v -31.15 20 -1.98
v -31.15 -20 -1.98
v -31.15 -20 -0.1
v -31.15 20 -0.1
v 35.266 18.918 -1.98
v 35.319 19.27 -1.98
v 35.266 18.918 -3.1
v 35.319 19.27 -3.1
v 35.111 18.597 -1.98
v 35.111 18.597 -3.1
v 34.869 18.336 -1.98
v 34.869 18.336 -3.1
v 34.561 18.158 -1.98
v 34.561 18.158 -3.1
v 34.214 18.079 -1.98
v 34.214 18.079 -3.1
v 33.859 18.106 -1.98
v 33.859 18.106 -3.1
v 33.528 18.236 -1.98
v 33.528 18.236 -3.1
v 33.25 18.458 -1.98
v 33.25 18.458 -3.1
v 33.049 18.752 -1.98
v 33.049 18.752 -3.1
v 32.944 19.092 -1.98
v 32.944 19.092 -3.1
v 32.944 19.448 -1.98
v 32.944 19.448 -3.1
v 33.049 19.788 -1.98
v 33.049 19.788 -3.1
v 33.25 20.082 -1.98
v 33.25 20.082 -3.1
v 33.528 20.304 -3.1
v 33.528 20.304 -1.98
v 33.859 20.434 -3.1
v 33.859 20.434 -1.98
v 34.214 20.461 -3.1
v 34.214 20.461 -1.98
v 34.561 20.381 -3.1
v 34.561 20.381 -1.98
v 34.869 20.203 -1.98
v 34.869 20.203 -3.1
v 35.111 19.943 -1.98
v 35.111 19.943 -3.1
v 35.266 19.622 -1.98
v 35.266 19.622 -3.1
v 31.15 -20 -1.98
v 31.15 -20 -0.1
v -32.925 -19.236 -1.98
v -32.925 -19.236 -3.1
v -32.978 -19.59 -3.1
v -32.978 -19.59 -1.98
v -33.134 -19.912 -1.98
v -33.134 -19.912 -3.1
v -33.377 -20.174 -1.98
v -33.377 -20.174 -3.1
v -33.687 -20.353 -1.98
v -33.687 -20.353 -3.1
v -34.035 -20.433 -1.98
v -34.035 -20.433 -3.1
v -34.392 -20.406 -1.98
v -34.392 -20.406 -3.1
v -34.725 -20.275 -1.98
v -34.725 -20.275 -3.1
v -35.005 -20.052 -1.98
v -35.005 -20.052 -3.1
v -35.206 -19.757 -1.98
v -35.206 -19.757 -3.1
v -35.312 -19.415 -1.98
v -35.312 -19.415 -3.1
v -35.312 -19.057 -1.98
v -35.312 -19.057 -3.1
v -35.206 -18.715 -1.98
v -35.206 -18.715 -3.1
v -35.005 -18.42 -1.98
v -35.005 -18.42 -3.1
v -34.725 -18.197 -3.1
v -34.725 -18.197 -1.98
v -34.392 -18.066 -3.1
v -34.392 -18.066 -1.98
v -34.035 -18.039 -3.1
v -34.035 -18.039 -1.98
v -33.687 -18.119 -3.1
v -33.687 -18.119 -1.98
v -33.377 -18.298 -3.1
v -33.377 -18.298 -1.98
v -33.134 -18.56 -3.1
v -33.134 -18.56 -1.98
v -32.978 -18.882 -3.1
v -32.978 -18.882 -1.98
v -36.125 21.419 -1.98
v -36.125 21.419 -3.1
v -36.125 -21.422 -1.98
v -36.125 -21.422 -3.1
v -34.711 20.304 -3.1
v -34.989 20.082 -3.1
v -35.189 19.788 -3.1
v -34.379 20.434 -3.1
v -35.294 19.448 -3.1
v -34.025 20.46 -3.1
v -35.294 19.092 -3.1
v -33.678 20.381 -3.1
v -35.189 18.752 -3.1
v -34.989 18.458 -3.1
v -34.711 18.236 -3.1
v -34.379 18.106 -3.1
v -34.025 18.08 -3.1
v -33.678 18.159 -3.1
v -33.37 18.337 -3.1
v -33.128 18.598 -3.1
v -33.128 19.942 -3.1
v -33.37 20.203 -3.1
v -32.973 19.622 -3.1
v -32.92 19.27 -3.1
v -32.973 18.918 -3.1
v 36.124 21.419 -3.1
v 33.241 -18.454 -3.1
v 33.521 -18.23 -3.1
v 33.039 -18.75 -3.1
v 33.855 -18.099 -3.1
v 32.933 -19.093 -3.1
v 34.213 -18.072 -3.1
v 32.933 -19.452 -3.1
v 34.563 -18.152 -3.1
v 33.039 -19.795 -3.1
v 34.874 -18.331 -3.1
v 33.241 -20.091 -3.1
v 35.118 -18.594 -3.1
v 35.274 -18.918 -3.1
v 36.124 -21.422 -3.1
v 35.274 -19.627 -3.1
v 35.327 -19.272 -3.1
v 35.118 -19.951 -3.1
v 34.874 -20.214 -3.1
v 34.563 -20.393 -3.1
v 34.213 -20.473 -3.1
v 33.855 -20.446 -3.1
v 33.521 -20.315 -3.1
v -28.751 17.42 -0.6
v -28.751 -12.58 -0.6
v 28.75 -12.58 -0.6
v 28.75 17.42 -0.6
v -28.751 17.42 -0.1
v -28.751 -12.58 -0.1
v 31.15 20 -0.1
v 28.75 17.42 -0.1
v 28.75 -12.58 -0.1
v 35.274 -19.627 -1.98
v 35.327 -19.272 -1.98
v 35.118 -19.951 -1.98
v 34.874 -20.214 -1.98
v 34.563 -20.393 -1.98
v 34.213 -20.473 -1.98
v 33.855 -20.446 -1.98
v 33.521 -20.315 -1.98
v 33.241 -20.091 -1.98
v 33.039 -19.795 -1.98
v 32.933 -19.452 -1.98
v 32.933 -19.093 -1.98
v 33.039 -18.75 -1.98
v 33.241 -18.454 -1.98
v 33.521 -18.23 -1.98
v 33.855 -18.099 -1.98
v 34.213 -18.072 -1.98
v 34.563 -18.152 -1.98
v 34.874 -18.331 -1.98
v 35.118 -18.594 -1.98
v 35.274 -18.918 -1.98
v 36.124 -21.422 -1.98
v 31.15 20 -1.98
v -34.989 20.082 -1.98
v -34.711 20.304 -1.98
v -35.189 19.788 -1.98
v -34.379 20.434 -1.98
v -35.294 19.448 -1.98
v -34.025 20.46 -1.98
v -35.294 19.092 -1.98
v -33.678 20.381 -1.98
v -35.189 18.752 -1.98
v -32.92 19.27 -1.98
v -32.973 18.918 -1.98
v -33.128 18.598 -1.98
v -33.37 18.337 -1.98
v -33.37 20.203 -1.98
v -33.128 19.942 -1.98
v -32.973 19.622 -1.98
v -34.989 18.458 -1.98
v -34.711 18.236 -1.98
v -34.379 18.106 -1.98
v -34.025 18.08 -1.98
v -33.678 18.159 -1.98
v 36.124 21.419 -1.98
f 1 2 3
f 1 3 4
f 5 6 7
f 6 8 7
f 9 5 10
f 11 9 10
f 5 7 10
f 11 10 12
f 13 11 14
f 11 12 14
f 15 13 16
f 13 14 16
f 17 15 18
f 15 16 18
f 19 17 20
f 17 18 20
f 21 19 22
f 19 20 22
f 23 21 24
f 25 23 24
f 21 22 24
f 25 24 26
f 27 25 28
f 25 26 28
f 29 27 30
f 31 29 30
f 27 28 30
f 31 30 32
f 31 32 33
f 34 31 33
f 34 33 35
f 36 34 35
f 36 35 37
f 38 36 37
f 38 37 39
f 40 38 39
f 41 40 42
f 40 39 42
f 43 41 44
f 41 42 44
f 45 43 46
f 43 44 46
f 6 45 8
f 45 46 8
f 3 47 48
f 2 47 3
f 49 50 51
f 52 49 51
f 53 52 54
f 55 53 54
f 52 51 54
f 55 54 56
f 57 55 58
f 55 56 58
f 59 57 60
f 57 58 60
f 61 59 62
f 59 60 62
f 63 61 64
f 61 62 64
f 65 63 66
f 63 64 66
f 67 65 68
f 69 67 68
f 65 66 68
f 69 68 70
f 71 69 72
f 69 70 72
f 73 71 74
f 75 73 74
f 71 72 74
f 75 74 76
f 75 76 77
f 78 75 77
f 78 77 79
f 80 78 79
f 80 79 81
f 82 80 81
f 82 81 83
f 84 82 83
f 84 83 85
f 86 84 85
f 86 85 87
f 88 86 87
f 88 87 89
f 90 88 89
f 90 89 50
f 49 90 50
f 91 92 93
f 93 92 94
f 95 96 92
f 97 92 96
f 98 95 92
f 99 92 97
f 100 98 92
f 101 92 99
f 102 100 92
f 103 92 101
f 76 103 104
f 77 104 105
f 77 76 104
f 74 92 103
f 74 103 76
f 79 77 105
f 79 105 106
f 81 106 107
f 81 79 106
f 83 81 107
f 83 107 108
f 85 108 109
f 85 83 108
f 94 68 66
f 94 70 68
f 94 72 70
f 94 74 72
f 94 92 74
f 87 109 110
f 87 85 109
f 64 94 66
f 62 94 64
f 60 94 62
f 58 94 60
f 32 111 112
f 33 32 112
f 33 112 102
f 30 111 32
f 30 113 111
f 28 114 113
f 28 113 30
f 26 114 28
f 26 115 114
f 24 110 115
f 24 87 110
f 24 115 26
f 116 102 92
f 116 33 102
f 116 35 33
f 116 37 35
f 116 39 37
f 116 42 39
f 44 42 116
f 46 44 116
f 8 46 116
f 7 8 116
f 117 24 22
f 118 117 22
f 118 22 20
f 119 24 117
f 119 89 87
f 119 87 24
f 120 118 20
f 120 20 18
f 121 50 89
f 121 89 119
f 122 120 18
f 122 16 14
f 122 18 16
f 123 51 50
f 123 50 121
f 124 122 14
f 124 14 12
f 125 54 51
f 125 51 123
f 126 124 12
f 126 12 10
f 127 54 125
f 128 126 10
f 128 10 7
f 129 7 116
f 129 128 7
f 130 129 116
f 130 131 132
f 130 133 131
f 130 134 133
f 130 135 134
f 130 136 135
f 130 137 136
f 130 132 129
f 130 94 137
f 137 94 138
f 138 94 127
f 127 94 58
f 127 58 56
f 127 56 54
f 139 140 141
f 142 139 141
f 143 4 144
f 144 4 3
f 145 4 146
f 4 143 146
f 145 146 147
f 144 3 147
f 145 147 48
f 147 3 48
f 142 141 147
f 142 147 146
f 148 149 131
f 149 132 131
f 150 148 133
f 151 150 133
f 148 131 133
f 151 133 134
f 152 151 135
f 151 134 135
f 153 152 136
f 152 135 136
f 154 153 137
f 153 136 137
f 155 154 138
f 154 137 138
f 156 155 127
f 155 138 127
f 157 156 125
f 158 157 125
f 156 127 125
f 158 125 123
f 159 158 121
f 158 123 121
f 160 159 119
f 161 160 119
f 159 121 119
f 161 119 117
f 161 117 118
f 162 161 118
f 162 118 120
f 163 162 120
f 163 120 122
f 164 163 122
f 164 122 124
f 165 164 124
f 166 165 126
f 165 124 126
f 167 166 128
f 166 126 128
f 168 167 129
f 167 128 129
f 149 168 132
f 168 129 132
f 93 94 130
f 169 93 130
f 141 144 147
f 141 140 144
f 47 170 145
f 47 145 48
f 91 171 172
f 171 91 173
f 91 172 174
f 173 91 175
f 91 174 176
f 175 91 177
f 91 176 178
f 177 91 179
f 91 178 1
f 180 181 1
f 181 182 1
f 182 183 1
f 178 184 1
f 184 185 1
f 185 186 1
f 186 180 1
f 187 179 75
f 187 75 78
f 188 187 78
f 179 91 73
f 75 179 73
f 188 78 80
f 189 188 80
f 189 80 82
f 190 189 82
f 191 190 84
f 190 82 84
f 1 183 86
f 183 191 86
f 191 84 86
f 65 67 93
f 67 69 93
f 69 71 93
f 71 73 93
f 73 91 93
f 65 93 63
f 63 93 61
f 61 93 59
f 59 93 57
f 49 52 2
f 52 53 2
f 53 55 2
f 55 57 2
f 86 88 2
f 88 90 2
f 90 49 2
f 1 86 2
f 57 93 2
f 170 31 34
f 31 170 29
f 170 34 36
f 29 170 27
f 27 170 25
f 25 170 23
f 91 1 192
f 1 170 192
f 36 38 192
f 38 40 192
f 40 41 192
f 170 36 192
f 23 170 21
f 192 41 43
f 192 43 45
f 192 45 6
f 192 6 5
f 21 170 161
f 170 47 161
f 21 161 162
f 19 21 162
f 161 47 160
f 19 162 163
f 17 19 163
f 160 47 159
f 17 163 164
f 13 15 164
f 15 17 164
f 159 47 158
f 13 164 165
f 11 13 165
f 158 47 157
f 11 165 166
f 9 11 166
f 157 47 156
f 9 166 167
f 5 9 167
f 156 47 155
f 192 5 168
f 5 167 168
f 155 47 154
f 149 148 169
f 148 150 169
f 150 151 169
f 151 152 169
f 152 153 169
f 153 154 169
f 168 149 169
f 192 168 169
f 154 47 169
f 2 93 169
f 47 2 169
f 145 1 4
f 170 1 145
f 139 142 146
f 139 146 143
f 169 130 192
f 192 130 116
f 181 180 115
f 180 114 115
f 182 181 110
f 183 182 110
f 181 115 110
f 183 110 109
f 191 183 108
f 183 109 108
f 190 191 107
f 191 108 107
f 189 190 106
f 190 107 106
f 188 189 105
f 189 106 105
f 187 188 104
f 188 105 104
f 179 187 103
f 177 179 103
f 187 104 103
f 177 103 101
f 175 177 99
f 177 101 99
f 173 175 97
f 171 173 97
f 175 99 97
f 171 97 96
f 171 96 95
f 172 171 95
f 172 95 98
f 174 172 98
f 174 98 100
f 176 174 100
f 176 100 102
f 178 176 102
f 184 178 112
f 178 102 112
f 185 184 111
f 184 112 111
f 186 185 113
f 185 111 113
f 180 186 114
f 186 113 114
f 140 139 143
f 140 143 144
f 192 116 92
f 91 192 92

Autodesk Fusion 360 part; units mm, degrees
sketch "Sketch1" plane through (0, 0, 0) normal (0, 0, 1) x (1, 0, 0)
  line L0 (36.125, -21.42) -> (-36.125, -21.42)
  line L1 (-36.125, -21.42) -> (-36.125, 21.42)
  line L2 (-36.125, 21.42) -> (36.125, 21.42)
  line L3 (36.125, 21.42) -> (36.125, -21.42)
  line L4 (36.125, -21.42) -> (-36.125, 21.42) construction
  line L5 (-36.125, -21.42) -> (36.125, 21.42) construction
  line L6 (31.15, -20) -> (-31.15, -20)
  line L7 (-31.15, -20) -> (-31.15, 20)
  line L8 (-31.15, 20) -> (31.15, 20)
  line L9 (31.15, 20) -> (31.15, -20)
  line L10 (31.15, -20) -> (-31.15, 20) construction
  line L11 (-31.15, -20) -> (31.15, 20) construction
  line L12 (28.75, -15) -> (-28.75, 15) construction
  line L13 (-28.75, -15) -> (28.75, 15) construction
  line L14 (36.125, -18.0538) -> (34.125, -18.0538) construction
  line L15 (34.125, -21.42) -> (34.125, 22) construction
  line L16 (-36.125, 20.5191) -> (-34.125, 20.5191) construction
  line L17 (-34.125, 20.5191) -> (-34.125, -21.42) construction
  circle A0 centre (-34.125, -19.236) radius 1.2
  line L18 (-34.125, -21.42) -> (-34.125, -20.67)
  line L19 (-34.1139, 21.42) -> (-34.1139, 19.27) construction
  circle A1 centre (-34.1139, 19.27) radius 1.2
  line L20 (34.125, 21.42) -> (34.125, 19.27) construction
  circle A2 centre (34.125, 19.27) radius 1.2
  line L21 (34.125, -21.42) -> (34.125, -19.27) construction
  circle A3 centre (34.125, -19.27) radius 1.2
  line L22 (0, 21.42) -> (0, 17.42) construction
  line L23 (0, 17.42) -> (28.75, 17.42) construction
  line L24 (28.75, 17.42) -> (-28.75, 17.42)
  line L25 (-28.75, 17.42) -> (-28.75, -12.58)
  line L26 (-28.75, -12.58) -> (28.75, -12.58)
  line L27 (28.75, -12.58) -> (28.75, 17.42)
  circle A4 centre (34.125, 19.27) radius 2
  circle A5 centre (-34.1139, 19.27) radius 2
  circle A6 centre (-34.125, -19.236) radius 2
  circle A7 centre (34.125, -19.27) radius 2
  line L28 (38.125, 23.42) -> (-38.125, 23.42)
  line L29 (-38.125, 23.42) -> (-38.125, -23.42)
  line L30 (-38.125, -23.42) -> (38.125, -23.42)
  line L31 (38.125, -23.42) -> (38.125, 23.42)
  line L32 (38.125, 23.42) -> (-38.125, -23.42) construction
  line L33 (-38.125, 23.42) -> (38.125, -23.42) construction
  line L34 (37.25, 22.25) -> (-37.25, 22.25)
  line L35 (-37.25, 22.25) -> (-37.25, -22.25)
  line L36 (-37.25, -22.25) -> (37.25, -22.25)
  line L37 (37.25, -22.25) -> (37.25, 22.25)
  line L38 (37.25, 22.25) -> (-37.25, -22.25) construction
  line L39 (-37.25, 22.25) -> (37.25, -22.25) construction
  dimension "d1" = 72.25
  dimension "d2" = 42.84
  dimension "d3" = 62.3
  dimension "d4" = 40
  dimension "d5" = 57.5
  dimension "d6" = 30
  dimension "d7" = 2
  dimension "d8" = 2
  dimension "d9" = 2.4
  dimension "d11" = 0.75
  dimension "d12" = 2.15
  dimension "d13" = 2.4
  dimension "d14" = 2.4
  dimension "d15" = 2.15
  dimension "d16" = 2.4
  dimension "d17" = 2.15
  dimension "d18" = 2.4
  dimension "d19" = 4
  dimension "d20" = 28.75
  dimension "d21" = 57.5
  dimension "d22" = 30
  dimension "d24" = 30
  dimension "d27" = 30
  dimension "d28" = 4
  dimension "d29" = 4
  dimension "d30" = 4
  dimension "d31" = 4
  dimension "d37" = 76.25
  dimension "d38" = 46.84
  dimension "d39" = 74.5
  dimension "d40" = 44.5
extrude "Extrude1" add sketch "Sketch1" against normal blind 3.1 contours A7 | A4 | A6 | A5 makes body 1 at (36.1225, 19.1703, -2.0667) makes body 2 at (36.1225, -19.3697, -2.0667) makes body 3 at (-32.1164, 19.1703, -2.0667) makes body 4 at (-32.1349, -19.0369, -1.0333)
extrude "Extrude2" add sketch "Sketch1" along normal blind 1 contours A7 | A4 | L0 L1 L2 L3 L18 A6 | L0 L1 L18 A6 | A6 | L6 L7 L8 L9 | A0 | A1 | A2 | A3 | A5 | L28 L29 L30 L31 | L34 L35 L36 L37 bodies 1 2 3 4
extrude "Extrude3" add sketch "Sketch1" against normal blind 3 contours L34 L35 L36 L37 bodies 1
fillet "Fillet1" radius 1 4 edges at (-38.125, 0, 1) (0, -23.42, 1) (38.125, 0, 1) (0, 23.42, 1) on bodies 1
chamfer "Chamfer1" distance 3 distance2 0.9 4 edges at (28.75, 2.42, 1) (0, 17.42, 1) (-28.75, 2.42, 1) (0, -12.58, 1) measured on face at (9.5833, -19.1401, 1) measured on face at (9.5833, -19.1401, 1) measured on face at (9.5833, -19.1401, 1) measured on face at (9.5833, -19.1401, 1) on bodies 1
sketch "Sketch2" plane through (0, 0, -3.1) normal (0, 0, -1) x (1, 0, 0)
  circle A0 centre (-34.125, 19.236) radius 1.2
  circle A1 centre (-34.125, 19.236) radius 2
  line L0 (-36.1253, 21.4221) -> (36.1242, 21.4221)
  line L1 (36.1242, 21.4221) -> (36.1242, -21.4189)
  line L2 (36.1242, -21.4189) -> (-36.1253, -21.4189)
  line L3 (-36.1253, -21.4189) -> (-36.1253, 21.4221)
  line L4 (-31.15, -20) -> (31.15, -20)
  line L5 (31.15, -20) -> (31.15, 20)
  line L6 (31.15, 20) -> (-31.15, 20)
  line L7 (-31.15, 20) -> (-31.15, -20)
  circle A2 centre (34.1232, 19.2725) radius 1.2039
  circle A3 centre (-34.125, 19.236) radius 1.2
  circle A4 centre (-34.1138, -19.2699) radius 1.1936
  circle A5 centre (34.1249, -19.2699) radius 1.194
  line L8 (-28.7509, 12.58) -> (28.75, 12.58)
  line L9 (28.75, 12.58) -> (28.75, -17.42)
  line L10 (28.75, -17.42) -> (-28.7509, -17.42)
  line L11 (-28.7509, -17.42) -> (-28.7509, 12.58)
extrude "Extrude1'" add sketch "Sketch2" against normal blind 1.12 separate body contours L0 L1 L2 L3 | L4 L5 L6 L7 | L8 L9 L10 L11 makes body 5 in component "Component"
extrude "Extrude2'" add sketch "Sketch2" against normal blind 3 contours L4 L5 L6 L7 bodies 5 in component "Component"
extrude "Extrude3'" add sketch "Sketch2" against normal blind 2.5 contours L8 L9 L10 L11 bodies 5 in component "Component"
extrude "Extrude4" add sketch "Sketch2" against normal blind 1.12 contours A1 bodies 5 in component "Component"
component "Component" placed x (1, 0, 0) y (0, 1, 0) z (0, 0, 1) at (0, 0, 0)
hidden bodies 1
equation "d20 = ( 57.5 / 2 ) * 1 mm"
